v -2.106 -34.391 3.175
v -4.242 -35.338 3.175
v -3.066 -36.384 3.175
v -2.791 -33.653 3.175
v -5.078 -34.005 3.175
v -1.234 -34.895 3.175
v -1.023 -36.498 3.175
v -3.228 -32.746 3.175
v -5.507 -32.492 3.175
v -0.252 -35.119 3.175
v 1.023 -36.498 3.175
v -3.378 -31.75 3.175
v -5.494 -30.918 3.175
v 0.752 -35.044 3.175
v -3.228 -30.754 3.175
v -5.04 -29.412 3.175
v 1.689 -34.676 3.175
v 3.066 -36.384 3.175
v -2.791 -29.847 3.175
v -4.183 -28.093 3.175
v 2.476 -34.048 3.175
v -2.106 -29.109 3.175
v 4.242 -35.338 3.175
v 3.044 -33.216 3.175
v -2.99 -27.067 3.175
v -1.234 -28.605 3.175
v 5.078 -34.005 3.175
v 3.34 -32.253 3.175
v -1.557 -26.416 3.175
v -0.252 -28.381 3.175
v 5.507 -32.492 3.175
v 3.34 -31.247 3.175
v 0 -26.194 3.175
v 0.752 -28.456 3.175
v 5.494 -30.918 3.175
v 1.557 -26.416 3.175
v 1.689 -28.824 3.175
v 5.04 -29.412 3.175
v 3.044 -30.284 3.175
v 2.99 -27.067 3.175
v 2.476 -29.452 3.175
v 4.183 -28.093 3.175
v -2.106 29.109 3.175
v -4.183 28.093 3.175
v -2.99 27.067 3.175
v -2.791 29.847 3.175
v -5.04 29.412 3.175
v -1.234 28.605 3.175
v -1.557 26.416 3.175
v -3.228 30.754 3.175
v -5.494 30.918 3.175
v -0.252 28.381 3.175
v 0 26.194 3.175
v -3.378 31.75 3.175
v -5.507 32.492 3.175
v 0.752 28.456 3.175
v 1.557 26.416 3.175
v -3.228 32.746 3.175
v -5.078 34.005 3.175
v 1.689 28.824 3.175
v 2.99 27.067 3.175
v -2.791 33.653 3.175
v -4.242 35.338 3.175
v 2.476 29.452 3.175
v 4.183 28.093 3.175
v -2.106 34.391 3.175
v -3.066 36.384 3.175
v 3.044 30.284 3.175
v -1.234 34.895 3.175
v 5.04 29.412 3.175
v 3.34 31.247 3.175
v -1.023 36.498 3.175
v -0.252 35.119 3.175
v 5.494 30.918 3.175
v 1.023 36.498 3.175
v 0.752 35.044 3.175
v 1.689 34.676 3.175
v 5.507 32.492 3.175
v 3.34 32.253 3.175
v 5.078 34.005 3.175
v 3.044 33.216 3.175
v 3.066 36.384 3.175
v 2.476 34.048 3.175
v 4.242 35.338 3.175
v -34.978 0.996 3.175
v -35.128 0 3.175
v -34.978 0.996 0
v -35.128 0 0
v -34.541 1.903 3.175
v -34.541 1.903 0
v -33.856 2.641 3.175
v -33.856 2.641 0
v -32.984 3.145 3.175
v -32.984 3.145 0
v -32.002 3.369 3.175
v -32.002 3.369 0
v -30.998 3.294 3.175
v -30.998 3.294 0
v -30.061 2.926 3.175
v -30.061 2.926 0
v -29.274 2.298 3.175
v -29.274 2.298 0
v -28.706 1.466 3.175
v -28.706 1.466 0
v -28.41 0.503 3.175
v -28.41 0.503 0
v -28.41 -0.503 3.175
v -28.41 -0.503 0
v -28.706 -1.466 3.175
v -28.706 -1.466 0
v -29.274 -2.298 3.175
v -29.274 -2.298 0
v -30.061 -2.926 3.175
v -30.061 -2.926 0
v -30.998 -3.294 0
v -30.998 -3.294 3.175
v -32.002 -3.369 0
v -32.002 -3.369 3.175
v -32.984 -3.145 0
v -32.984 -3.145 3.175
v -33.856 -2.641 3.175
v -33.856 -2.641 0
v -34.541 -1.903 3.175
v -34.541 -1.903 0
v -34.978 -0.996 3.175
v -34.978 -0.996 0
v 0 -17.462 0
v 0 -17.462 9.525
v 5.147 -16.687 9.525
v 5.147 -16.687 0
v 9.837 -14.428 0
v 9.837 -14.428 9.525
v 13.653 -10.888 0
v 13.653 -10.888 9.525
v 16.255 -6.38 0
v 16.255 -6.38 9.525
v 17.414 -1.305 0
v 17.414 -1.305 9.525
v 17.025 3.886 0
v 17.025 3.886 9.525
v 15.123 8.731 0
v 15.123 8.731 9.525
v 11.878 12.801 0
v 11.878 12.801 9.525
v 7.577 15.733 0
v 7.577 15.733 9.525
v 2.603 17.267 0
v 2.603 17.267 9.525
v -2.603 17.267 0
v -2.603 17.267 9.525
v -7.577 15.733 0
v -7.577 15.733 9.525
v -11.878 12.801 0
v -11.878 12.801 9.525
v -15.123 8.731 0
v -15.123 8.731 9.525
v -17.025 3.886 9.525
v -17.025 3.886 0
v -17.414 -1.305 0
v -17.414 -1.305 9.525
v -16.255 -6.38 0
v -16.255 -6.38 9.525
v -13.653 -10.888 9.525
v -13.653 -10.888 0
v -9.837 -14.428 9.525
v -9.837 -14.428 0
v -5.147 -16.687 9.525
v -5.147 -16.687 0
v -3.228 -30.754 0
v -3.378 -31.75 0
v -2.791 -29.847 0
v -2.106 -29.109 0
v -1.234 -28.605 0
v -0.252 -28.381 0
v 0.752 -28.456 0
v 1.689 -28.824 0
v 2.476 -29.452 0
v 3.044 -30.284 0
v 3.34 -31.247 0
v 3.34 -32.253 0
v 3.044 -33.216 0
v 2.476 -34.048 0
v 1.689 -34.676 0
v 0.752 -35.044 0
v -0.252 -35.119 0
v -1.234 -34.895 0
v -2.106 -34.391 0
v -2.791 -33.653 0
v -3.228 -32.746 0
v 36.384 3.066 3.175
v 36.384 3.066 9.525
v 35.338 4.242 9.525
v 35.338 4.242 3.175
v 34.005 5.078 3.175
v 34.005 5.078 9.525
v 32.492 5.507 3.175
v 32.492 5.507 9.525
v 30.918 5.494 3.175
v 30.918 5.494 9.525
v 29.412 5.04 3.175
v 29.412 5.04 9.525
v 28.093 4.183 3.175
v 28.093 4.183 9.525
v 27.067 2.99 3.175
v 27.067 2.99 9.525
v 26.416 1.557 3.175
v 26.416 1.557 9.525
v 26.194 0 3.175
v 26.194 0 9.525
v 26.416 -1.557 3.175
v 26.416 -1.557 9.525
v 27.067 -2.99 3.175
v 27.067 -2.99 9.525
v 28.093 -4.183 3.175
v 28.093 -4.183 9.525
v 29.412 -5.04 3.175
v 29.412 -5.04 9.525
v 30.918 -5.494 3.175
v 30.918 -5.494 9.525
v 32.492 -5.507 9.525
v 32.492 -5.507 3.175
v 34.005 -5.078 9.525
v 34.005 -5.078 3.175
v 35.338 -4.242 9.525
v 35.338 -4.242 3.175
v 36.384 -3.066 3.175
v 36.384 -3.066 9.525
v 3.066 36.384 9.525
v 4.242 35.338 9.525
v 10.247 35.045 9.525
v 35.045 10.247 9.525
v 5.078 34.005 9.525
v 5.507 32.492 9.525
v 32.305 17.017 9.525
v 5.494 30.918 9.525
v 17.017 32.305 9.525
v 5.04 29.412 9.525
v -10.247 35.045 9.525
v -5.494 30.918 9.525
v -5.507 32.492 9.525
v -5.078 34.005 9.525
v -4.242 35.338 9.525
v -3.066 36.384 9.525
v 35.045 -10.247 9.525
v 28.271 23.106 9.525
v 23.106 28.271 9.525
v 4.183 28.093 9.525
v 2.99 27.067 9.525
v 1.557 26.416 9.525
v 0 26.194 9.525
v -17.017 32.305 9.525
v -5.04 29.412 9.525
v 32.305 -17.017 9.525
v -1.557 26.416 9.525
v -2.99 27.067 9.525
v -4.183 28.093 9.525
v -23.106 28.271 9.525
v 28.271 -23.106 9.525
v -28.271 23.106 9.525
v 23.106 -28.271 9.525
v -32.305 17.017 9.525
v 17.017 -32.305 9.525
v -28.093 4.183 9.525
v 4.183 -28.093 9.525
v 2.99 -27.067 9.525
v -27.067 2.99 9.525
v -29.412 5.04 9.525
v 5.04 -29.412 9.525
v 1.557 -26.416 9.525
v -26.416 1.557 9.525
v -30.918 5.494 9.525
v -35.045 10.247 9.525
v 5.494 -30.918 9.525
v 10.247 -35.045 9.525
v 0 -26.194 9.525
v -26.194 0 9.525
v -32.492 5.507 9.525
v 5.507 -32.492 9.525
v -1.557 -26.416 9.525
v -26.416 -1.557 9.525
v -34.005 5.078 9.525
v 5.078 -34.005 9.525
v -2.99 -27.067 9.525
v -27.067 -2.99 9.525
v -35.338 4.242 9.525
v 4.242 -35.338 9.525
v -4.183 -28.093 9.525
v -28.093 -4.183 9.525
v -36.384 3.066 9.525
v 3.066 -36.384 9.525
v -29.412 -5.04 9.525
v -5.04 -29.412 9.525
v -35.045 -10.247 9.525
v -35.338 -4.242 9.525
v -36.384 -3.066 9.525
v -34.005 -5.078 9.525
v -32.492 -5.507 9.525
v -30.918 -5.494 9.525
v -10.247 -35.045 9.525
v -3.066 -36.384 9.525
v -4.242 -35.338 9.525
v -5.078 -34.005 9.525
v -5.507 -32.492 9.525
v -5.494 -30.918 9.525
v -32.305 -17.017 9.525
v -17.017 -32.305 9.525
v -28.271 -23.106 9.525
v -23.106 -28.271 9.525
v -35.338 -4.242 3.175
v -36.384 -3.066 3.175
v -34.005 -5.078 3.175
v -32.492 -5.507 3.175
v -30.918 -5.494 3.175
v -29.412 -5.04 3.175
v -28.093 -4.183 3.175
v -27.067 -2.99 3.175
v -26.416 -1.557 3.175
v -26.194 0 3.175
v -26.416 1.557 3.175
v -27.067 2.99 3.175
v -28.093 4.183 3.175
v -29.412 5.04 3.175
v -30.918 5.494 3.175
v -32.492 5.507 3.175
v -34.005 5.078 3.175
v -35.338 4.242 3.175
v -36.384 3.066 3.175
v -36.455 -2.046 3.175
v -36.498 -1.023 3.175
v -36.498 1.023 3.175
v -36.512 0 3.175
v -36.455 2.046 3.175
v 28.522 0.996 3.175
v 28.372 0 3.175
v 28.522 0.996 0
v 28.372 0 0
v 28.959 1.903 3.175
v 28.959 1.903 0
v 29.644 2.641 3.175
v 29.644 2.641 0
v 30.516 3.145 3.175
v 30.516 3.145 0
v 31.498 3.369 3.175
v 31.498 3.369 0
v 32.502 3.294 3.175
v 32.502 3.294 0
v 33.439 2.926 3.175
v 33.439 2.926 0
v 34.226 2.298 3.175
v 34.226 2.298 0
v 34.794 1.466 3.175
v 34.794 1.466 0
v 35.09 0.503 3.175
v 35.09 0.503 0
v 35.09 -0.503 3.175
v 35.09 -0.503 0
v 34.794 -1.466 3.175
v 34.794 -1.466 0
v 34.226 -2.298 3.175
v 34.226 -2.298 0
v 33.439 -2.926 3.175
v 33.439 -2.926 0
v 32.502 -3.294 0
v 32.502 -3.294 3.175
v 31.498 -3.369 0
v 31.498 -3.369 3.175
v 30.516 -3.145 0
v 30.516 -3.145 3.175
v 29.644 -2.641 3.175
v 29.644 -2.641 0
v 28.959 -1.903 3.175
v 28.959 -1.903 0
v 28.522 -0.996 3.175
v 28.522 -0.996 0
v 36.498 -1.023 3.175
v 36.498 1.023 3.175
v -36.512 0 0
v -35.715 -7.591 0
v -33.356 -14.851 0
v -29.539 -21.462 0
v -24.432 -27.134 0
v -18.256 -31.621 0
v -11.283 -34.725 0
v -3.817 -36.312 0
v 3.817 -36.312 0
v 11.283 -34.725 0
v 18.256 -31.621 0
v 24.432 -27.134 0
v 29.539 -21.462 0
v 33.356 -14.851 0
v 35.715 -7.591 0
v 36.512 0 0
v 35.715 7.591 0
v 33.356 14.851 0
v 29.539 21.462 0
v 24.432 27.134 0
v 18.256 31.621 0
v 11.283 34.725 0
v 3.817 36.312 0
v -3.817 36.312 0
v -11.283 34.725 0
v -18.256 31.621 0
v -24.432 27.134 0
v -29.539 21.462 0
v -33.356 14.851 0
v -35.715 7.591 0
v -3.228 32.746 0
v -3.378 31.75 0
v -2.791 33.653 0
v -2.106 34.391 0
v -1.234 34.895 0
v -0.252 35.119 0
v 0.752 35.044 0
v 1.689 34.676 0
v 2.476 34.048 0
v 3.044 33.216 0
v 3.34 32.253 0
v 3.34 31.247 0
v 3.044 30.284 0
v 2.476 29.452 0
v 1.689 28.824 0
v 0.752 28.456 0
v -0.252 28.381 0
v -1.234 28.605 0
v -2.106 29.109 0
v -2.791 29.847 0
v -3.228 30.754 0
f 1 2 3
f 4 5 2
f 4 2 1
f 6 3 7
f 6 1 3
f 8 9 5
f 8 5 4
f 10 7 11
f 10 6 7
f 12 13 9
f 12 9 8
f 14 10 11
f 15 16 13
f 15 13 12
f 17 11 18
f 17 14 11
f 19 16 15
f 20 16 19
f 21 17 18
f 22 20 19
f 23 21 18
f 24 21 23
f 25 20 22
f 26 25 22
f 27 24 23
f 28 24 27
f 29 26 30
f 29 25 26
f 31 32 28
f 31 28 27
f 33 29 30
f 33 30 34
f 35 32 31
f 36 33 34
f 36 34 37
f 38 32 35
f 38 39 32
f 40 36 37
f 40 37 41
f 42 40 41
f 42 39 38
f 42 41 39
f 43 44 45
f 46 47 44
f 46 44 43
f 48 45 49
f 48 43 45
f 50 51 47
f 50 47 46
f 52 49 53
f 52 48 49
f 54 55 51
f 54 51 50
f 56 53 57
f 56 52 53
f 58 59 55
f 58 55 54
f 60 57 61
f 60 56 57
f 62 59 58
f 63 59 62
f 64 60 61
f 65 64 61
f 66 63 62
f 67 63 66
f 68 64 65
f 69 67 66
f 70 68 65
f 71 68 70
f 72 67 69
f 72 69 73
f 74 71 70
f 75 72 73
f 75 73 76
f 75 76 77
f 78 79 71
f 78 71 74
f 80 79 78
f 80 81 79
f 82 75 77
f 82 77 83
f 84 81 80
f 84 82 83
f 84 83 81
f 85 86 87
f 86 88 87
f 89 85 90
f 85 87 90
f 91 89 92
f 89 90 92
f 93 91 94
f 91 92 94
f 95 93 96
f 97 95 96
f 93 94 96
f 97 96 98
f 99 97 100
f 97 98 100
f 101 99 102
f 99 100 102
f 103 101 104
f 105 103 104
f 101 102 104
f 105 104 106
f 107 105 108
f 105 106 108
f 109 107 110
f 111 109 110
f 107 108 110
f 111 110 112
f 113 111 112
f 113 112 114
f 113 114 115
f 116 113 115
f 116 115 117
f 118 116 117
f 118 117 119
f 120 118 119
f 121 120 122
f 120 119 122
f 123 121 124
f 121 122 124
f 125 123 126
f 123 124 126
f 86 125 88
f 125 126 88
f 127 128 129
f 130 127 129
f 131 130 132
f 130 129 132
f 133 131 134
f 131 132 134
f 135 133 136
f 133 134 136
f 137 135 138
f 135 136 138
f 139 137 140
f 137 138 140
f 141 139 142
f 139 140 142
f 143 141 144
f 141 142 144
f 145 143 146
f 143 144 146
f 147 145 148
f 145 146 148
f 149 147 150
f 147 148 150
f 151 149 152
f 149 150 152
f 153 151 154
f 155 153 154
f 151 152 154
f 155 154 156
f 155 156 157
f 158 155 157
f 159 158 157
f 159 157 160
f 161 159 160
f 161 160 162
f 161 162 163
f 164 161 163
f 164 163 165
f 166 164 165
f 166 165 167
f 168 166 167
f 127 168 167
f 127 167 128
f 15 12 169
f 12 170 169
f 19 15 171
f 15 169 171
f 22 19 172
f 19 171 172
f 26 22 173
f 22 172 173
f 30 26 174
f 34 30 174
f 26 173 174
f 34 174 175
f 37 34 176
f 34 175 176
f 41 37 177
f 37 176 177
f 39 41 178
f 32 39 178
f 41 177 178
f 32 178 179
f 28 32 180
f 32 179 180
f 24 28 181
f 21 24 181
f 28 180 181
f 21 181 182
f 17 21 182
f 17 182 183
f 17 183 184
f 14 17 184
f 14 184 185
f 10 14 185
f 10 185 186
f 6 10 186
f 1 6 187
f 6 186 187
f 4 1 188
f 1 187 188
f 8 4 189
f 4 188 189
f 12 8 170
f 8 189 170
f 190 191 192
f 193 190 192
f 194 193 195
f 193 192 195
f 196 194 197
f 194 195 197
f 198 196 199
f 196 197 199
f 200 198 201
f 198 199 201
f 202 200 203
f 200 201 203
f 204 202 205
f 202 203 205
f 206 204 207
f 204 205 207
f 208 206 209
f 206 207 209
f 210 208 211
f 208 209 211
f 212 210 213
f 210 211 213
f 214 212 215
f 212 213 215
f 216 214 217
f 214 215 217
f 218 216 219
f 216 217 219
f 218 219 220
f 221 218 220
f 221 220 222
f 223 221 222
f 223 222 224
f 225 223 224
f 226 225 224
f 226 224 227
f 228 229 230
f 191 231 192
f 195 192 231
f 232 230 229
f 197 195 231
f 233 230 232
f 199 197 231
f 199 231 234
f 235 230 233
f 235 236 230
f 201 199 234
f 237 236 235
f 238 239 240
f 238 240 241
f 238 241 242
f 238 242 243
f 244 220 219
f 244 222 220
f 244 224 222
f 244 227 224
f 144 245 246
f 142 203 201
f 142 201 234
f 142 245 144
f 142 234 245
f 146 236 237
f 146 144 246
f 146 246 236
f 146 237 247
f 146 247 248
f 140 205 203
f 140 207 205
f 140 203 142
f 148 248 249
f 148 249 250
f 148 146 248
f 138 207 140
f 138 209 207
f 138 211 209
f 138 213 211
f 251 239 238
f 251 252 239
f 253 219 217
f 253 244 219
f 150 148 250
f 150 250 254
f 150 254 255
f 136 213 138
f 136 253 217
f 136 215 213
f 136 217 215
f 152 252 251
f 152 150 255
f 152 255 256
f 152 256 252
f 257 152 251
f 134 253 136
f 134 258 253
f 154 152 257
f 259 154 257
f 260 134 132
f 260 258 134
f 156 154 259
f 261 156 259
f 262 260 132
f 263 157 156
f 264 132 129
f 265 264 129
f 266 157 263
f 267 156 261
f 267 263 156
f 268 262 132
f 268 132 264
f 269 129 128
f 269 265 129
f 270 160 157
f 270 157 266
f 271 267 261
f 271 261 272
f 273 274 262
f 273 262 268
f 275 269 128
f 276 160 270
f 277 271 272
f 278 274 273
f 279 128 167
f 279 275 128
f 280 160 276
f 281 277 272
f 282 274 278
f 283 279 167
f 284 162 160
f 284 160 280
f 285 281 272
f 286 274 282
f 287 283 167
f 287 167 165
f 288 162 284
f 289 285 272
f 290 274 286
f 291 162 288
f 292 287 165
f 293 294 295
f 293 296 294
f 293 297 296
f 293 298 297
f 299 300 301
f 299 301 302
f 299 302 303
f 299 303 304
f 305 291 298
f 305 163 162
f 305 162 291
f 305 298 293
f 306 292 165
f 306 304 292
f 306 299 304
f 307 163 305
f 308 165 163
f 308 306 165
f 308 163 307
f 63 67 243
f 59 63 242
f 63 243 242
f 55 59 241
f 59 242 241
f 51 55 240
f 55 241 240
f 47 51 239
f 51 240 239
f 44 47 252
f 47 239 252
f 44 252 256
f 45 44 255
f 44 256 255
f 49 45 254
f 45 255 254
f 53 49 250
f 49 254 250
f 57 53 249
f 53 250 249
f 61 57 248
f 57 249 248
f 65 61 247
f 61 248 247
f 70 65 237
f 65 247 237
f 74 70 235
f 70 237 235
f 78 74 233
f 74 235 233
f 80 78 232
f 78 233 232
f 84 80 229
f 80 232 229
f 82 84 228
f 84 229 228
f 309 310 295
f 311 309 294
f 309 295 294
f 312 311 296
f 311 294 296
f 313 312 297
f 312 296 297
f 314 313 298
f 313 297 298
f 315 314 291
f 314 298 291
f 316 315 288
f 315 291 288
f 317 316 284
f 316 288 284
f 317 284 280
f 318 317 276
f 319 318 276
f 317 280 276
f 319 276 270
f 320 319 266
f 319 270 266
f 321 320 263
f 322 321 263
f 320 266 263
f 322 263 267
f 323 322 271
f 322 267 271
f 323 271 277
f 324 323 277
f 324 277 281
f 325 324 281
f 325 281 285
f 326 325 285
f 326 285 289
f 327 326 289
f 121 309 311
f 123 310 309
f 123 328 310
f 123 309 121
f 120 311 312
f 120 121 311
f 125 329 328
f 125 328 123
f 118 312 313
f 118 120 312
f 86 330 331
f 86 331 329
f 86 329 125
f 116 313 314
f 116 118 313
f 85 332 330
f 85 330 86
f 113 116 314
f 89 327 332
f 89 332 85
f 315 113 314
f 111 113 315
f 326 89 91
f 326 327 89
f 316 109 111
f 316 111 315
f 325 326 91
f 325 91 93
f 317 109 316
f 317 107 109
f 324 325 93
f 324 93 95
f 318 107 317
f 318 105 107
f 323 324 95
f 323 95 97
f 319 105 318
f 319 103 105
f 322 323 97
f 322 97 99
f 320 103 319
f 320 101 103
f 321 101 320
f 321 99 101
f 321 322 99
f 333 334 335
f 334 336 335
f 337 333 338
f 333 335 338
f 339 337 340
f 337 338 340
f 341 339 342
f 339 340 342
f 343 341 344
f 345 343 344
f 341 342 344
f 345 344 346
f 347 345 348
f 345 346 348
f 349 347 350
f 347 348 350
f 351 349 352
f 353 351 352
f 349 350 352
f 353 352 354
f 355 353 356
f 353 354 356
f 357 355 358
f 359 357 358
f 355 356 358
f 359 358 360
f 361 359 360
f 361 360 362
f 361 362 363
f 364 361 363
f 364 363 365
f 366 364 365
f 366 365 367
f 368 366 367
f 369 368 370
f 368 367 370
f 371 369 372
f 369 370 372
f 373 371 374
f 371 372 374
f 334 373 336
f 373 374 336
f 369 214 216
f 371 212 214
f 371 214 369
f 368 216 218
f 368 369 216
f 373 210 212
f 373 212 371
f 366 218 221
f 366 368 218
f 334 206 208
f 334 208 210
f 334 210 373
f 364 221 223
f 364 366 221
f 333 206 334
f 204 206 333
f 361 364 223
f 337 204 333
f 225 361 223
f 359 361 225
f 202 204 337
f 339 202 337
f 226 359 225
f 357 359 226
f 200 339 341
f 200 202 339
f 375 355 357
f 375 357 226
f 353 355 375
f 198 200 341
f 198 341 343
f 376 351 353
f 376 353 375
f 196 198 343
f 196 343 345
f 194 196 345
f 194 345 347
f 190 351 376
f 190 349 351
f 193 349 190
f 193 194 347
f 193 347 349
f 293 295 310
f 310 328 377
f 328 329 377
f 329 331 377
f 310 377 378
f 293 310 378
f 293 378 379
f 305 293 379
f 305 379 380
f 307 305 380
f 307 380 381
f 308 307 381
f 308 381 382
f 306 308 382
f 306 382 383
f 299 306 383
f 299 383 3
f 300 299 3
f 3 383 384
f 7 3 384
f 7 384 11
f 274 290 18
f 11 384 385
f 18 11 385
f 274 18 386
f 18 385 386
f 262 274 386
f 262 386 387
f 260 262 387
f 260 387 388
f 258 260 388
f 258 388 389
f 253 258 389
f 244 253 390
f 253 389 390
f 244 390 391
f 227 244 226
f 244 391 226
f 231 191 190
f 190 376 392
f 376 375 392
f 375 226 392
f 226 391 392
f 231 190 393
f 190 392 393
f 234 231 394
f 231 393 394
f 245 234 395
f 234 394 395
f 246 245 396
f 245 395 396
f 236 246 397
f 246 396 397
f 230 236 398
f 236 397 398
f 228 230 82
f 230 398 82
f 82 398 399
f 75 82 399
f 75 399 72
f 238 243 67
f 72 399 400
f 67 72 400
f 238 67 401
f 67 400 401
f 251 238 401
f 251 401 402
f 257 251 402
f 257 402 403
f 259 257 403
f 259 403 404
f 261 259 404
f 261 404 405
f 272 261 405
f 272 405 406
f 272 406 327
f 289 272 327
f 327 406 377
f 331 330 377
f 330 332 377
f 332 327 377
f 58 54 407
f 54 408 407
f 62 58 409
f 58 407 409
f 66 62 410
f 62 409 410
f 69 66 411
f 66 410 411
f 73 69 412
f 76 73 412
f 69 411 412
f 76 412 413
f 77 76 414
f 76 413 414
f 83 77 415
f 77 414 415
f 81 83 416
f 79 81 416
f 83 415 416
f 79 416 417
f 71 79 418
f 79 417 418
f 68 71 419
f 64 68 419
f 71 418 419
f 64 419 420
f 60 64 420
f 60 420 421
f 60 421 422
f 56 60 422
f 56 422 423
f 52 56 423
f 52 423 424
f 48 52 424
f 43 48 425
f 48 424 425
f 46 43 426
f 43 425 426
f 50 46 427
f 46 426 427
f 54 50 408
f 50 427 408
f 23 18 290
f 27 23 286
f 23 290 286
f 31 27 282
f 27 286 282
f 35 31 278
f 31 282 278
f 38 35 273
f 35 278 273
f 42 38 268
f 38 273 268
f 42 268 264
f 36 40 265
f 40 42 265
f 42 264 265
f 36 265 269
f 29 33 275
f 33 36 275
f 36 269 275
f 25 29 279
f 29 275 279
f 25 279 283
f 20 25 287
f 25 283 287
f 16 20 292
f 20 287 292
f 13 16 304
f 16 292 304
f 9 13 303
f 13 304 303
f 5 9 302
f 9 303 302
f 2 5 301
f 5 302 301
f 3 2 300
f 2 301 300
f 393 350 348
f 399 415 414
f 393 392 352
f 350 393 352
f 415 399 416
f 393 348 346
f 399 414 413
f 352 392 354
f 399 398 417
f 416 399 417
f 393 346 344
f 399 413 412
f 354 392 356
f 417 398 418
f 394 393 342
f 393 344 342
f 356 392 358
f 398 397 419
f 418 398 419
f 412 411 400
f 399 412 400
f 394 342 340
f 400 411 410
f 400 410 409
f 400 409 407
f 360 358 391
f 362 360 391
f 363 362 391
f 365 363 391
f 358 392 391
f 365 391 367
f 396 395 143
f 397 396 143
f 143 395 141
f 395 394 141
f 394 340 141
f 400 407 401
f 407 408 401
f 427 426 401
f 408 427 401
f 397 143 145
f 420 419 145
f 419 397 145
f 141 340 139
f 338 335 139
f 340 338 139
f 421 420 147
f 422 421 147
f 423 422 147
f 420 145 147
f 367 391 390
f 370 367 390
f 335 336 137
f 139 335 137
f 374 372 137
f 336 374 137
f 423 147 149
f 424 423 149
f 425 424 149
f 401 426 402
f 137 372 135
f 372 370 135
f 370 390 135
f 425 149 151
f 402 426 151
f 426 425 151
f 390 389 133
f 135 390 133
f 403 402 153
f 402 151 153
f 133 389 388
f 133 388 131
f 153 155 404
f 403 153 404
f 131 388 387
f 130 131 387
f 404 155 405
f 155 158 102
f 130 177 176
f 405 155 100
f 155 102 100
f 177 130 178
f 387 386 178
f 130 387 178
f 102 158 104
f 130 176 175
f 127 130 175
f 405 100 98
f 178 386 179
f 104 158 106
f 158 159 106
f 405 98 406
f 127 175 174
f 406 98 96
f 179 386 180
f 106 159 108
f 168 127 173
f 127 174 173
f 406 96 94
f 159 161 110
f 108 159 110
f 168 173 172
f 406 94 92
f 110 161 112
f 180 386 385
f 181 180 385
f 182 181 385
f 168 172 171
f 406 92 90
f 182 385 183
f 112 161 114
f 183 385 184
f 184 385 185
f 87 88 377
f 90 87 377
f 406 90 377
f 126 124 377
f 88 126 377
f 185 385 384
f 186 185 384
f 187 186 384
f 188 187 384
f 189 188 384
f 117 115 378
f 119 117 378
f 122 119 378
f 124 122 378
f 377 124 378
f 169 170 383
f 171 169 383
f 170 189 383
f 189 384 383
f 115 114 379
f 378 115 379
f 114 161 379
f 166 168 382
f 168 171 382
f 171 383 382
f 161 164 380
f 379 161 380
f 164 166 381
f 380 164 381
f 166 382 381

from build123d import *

# Parameters (mm, degrees)
SKETCH1_R                                        = 36.5125
EXTRUDE1_DEPTH                                   = 9.525
SKETCH2_R                                        = 17.4625
SHAFT_THRU_HOLE_DEPTH                            = 53.507627422
CBORE_FOR_1_4_SOCKET_HEAD_CAP_SCREW1_D           = 6.7564
CBORE_FOR_1_4_SOCKET_HEAD_CAP_SCREW1_CBORE_D     = 11.1125
CBORE_FOR_1_4_SOCKET_HEAD_CAP_SCREW1_CBORE_DEPTH = 6.35


with BuildPart() as part:
    # Sketch1 → Extrude1 (new body)
    with BuildSketch(Plane.XY):
        with Locations(Location((0, 0, 0), (0, 0, 180))):
            Circle(SKETCH1_R)
    extrude(amount=EXTRUDE1_DEPTH)

    # Sketch2 → Shaft thru hole (cut, through all)
    with BuildSketch(Plane(origin=(0, 0, 9.525), x_dir=(-1, 0, 0), z_dir=(0, 0, 1))):
        with Locations(Location((0, 0, 0), (0, 0, 90))):
            Circle(SKETCH2_R)
    extrude(amount=-SHAFT_THRU_HOLE_DEPTH, mode=Mode.SUBTRACT)

    # CBORE for 1/4 Socket Head Cap Screw1 (through all)
    with Locations(Plane.XY.offset(9.525)):
        with Locations((0, 31.75), (-31.75, 0), (31.75, 0), (0, -31.75)):
            CounterBoreHole(CBORE_FOR_1_4_SOCKET_HEAD_CAP_SCREW1_D / 2, CBORE_FOR_1_4_SOCKET_HEAD_CAP_SCREW1_CBORE_D / 2, CBORE_FOR_1_4_SOCKET_HEAD_CAP_SCREW1_CBORE_DEPTH)


solid = part.part
